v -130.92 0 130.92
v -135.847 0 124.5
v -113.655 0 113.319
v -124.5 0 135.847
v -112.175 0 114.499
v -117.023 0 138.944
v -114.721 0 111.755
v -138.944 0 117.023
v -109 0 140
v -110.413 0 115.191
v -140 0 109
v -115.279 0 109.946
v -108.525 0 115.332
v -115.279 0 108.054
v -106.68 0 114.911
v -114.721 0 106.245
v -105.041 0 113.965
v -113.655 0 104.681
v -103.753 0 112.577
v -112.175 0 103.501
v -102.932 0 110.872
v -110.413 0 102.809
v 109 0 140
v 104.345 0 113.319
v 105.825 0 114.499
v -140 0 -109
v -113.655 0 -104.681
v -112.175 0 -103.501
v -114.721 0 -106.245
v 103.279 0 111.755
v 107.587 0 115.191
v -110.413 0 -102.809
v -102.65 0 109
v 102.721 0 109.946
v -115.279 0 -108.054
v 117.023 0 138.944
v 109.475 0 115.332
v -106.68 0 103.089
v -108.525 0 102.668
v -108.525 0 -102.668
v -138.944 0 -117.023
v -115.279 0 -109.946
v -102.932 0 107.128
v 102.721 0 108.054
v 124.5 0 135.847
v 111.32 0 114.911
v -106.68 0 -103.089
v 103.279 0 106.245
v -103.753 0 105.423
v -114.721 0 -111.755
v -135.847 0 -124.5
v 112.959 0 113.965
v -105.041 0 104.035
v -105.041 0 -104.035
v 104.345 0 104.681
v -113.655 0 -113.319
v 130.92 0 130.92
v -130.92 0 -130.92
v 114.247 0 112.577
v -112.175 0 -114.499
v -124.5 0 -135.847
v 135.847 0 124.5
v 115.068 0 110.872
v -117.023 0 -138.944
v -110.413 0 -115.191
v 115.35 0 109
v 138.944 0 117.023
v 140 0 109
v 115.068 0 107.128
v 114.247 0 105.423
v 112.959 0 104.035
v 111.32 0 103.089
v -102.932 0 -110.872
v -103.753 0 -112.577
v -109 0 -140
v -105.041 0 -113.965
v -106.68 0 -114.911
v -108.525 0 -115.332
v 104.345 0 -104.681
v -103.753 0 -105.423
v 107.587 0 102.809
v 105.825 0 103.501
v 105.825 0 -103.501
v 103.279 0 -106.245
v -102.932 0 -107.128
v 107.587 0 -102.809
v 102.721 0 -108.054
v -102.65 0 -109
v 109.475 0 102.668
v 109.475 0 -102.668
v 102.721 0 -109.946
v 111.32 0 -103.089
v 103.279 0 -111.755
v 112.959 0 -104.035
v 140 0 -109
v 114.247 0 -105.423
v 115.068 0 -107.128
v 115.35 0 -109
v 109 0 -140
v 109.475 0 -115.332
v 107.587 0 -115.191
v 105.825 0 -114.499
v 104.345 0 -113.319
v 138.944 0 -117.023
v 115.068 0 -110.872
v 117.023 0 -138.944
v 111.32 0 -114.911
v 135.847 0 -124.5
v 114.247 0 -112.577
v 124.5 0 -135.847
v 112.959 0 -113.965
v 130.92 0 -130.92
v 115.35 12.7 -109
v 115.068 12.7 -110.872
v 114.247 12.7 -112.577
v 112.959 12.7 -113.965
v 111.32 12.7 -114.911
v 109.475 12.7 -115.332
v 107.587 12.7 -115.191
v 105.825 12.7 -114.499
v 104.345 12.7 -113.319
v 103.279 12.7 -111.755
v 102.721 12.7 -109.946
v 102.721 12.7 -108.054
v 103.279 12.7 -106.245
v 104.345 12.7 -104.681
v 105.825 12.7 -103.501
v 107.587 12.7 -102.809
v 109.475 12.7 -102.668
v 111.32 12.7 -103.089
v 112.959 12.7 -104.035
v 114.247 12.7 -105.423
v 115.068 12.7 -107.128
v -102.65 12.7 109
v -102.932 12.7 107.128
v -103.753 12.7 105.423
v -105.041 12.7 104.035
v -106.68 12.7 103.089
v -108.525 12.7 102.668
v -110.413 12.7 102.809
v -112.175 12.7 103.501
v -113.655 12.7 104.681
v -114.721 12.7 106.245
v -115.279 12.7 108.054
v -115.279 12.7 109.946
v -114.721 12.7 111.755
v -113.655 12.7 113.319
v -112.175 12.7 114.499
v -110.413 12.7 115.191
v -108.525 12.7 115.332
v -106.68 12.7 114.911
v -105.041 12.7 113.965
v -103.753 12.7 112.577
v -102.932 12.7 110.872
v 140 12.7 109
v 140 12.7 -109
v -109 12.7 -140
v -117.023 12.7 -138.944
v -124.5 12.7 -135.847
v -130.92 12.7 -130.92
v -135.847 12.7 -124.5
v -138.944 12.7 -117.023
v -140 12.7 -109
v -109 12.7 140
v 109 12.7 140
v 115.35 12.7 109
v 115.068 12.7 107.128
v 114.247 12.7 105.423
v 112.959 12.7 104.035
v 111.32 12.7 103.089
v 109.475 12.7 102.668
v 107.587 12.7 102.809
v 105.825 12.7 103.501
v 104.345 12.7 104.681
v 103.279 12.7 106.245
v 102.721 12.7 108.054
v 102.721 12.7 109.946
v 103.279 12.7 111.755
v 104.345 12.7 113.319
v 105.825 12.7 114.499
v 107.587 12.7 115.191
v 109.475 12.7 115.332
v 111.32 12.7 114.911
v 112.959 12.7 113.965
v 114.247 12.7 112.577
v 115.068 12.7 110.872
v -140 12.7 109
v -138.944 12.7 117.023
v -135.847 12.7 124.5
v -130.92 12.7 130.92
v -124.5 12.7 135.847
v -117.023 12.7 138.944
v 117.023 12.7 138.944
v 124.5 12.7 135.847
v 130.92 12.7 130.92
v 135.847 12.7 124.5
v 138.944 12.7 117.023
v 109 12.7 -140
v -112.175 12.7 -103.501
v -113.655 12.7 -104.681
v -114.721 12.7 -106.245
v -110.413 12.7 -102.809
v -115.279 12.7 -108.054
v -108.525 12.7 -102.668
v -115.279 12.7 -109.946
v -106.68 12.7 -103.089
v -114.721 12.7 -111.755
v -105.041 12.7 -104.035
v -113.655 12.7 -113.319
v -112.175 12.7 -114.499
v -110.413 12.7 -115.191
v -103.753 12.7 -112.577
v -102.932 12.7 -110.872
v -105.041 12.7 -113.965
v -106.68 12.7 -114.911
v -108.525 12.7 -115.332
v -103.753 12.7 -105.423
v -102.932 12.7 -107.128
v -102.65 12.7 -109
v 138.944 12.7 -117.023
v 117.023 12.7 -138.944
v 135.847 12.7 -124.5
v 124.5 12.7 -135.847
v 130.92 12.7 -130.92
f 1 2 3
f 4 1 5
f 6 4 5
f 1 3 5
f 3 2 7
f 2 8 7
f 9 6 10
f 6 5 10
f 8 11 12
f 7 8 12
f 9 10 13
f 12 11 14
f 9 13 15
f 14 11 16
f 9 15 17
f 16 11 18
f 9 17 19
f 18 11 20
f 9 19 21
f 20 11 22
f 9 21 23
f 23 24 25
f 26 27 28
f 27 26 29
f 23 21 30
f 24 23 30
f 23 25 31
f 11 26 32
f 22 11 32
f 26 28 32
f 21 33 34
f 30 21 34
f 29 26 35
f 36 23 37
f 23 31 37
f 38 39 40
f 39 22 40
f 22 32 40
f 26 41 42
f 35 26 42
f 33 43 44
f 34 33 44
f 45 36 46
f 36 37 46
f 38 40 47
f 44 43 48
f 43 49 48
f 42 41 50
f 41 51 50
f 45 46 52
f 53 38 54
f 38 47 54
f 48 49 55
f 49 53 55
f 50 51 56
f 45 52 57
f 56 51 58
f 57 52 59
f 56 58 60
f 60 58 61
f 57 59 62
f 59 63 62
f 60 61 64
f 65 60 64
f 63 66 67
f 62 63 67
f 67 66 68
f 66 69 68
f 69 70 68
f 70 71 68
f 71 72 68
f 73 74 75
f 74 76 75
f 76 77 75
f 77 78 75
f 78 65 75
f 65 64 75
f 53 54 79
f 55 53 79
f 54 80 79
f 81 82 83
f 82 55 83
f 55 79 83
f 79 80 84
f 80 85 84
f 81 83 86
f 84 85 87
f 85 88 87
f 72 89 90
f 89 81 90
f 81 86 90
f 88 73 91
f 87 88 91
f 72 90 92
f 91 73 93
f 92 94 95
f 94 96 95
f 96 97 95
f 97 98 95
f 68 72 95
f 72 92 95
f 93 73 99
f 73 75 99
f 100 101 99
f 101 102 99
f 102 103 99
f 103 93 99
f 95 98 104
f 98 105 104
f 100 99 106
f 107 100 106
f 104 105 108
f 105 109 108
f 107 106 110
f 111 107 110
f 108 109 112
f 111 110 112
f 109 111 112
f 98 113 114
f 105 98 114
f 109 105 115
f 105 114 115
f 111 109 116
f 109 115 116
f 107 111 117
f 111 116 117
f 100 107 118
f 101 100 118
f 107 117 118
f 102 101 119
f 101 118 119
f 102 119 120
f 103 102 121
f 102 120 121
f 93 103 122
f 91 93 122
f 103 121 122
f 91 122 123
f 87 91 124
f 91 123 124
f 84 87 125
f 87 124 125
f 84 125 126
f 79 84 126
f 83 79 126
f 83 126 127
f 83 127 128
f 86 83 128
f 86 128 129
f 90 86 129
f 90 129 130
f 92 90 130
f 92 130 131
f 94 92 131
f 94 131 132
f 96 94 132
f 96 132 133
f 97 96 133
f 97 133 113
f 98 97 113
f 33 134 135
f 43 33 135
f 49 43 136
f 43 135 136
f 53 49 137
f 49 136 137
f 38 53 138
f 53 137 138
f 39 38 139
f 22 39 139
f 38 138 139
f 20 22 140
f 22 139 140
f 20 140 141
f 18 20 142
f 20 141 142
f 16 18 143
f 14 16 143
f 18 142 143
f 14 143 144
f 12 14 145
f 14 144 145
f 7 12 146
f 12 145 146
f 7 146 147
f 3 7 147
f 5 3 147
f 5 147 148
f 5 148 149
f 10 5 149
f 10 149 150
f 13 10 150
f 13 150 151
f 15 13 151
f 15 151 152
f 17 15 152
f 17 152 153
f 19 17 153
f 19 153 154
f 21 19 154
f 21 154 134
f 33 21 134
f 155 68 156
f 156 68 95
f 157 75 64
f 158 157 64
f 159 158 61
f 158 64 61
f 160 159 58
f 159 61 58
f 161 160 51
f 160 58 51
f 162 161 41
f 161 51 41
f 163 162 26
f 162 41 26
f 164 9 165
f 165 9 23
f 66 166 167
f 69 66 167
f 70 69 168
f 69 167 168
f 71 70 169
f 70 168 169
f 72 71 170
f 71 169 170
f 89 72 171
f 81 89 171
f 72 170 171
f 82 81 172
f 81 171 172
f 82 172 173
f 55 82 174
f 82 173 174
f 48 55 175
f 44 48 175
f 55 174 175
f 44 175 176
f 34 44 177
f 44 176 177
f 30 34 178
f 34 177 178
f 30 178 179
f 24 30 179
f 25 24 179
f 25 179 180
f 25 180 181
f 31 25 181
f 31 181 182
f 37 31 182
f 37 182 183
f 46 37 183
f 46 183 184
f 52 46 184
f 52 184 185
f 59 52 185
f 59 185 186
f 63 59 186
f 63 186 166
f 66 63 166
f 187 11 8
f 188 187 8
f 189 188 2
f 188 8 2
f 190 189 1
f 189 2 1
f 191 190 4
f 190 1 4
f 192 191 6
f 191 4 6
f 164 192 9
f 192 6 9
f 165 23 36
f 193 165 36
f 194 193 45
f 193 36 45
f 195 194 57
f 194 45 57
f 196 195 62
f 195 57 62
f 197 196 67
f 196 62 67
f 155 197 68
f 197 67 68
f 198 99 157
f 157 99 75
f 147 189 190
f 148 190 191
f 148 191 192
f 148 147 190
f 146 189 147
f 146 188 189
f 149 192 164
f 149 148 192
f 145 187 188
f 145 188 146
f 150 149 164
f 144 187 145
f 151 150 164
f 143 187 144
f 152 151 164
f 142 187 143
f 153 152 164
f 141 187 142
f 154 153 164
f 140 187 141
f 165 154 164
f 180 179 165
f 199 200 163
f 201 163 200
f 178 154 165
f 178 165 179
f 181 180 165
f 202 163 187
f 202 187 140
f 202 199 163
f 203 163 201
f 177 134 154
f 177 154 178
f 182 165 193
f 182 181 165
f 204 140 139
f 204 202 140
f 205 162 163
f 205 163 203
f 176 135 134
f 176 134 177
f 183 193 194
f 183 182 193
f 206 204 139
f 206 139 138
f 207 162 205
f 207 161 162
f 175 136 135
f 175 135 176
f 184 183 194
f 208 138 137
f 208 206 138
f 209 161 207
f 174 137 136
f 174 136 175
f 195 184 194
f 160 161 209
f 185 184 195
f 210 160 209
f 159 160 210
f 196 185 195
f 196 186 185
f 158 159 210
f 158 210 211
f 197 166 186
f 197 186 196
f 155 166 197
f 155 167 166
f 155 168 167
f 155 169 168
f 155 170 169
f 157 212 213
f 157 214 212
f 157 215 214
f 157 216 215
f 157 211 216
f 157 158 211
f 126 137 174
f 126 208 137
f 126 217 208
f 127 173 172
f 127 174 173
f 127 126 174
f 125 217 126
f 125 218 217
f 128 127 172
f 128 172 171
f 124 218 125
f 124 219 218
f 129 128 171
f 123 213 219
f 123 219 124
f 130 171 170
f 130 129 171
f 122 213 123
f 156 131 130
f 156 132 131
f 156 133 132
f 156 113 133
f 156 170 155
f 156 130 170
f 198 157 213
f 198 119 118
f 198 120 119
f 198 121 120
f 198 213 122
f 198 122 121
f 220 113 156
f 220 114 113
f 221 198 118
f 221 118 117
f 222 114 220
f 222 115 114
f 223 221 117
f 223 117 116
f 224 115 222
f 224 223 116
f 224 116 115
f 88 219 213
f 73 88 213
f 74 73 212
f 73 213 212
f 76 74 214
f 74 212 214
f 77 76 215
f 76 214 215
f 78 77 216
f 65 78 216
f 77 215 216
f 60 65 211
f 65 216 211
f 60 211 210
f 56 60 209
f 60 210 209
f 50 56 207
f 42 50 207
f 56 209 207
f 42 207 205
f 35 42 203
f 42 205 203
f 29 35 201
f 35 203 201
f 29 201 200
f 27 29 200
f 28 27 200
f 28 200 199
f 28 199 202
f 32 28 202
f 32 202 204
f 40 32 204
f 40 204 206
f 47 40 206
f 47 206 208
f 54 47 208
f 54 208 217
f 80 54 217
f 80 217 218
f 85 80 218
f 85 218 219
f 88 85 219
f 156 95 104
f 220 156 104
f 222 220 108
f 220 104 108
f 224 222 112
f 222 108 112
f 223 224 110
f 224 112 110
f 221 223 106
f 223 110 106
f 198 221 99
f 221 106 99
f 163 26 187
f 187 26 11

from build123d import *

# Parameters (mm, degrees)
SALIENTE_EXTRUIR1_DEPTH = 12.7
CROQUIS2_R              = 6.35
CORTAR_EXTRUIR1_DEPTH   = 13.7


with BuildPart() as part:
    # Croquis1 → Saliente-Extruir1 (new body)
    with BuildSketch(Plane(origin=(0, 0, 0), x_dir=(1, 0, 0), z_dir=(0, 1, 0))):
        with BuildLine():
            Line((-109, -140), (109, -140))
            ThreePointArc((109, -140), (130.920310217, -130.920310217), (140, -109))
            Line((140, -109), (140, 109))
            ThreePointArc((140, 109), (130.920310217, 130.920310217), (109, 140))
            Line((109, 140), (-109, 140))
            ThreePointArc((-109, 140), (-130.920310217, 130.920310217), (-140, 109))
            Line((-140, 109), (-140, -109))
            ThreePointArc((-140, -109), (-130.920310217, -130.920310217), (-109, -140))
        make_face()
    extrude(amount=SALIENTE_EXTRUIR1_DEPTH)

    # Croquis2 → Cortar-Extruir1 (cut, through all)
    with BuildSketch(Plane(origin=(0, 12.7, 0), x_dir=(1, 0, 0), z_dir=(0, 1, 0))):
        with Locations((109, 109)):
            Circle(CROQUIS2_R)
        with Locations((109, -109)):
            Circle(CROQUIS2_R)
        with Locations((-109, -109)):
            Circle(CROQUIS2_R)
        with Locations((-109, 109)):
            Circle(CROQUIS2_R)
    extrude(amount=-CORTAR_EXTRUIR1_DEPTH, mode=Mode.SUBTRACT)


solid = part.part
